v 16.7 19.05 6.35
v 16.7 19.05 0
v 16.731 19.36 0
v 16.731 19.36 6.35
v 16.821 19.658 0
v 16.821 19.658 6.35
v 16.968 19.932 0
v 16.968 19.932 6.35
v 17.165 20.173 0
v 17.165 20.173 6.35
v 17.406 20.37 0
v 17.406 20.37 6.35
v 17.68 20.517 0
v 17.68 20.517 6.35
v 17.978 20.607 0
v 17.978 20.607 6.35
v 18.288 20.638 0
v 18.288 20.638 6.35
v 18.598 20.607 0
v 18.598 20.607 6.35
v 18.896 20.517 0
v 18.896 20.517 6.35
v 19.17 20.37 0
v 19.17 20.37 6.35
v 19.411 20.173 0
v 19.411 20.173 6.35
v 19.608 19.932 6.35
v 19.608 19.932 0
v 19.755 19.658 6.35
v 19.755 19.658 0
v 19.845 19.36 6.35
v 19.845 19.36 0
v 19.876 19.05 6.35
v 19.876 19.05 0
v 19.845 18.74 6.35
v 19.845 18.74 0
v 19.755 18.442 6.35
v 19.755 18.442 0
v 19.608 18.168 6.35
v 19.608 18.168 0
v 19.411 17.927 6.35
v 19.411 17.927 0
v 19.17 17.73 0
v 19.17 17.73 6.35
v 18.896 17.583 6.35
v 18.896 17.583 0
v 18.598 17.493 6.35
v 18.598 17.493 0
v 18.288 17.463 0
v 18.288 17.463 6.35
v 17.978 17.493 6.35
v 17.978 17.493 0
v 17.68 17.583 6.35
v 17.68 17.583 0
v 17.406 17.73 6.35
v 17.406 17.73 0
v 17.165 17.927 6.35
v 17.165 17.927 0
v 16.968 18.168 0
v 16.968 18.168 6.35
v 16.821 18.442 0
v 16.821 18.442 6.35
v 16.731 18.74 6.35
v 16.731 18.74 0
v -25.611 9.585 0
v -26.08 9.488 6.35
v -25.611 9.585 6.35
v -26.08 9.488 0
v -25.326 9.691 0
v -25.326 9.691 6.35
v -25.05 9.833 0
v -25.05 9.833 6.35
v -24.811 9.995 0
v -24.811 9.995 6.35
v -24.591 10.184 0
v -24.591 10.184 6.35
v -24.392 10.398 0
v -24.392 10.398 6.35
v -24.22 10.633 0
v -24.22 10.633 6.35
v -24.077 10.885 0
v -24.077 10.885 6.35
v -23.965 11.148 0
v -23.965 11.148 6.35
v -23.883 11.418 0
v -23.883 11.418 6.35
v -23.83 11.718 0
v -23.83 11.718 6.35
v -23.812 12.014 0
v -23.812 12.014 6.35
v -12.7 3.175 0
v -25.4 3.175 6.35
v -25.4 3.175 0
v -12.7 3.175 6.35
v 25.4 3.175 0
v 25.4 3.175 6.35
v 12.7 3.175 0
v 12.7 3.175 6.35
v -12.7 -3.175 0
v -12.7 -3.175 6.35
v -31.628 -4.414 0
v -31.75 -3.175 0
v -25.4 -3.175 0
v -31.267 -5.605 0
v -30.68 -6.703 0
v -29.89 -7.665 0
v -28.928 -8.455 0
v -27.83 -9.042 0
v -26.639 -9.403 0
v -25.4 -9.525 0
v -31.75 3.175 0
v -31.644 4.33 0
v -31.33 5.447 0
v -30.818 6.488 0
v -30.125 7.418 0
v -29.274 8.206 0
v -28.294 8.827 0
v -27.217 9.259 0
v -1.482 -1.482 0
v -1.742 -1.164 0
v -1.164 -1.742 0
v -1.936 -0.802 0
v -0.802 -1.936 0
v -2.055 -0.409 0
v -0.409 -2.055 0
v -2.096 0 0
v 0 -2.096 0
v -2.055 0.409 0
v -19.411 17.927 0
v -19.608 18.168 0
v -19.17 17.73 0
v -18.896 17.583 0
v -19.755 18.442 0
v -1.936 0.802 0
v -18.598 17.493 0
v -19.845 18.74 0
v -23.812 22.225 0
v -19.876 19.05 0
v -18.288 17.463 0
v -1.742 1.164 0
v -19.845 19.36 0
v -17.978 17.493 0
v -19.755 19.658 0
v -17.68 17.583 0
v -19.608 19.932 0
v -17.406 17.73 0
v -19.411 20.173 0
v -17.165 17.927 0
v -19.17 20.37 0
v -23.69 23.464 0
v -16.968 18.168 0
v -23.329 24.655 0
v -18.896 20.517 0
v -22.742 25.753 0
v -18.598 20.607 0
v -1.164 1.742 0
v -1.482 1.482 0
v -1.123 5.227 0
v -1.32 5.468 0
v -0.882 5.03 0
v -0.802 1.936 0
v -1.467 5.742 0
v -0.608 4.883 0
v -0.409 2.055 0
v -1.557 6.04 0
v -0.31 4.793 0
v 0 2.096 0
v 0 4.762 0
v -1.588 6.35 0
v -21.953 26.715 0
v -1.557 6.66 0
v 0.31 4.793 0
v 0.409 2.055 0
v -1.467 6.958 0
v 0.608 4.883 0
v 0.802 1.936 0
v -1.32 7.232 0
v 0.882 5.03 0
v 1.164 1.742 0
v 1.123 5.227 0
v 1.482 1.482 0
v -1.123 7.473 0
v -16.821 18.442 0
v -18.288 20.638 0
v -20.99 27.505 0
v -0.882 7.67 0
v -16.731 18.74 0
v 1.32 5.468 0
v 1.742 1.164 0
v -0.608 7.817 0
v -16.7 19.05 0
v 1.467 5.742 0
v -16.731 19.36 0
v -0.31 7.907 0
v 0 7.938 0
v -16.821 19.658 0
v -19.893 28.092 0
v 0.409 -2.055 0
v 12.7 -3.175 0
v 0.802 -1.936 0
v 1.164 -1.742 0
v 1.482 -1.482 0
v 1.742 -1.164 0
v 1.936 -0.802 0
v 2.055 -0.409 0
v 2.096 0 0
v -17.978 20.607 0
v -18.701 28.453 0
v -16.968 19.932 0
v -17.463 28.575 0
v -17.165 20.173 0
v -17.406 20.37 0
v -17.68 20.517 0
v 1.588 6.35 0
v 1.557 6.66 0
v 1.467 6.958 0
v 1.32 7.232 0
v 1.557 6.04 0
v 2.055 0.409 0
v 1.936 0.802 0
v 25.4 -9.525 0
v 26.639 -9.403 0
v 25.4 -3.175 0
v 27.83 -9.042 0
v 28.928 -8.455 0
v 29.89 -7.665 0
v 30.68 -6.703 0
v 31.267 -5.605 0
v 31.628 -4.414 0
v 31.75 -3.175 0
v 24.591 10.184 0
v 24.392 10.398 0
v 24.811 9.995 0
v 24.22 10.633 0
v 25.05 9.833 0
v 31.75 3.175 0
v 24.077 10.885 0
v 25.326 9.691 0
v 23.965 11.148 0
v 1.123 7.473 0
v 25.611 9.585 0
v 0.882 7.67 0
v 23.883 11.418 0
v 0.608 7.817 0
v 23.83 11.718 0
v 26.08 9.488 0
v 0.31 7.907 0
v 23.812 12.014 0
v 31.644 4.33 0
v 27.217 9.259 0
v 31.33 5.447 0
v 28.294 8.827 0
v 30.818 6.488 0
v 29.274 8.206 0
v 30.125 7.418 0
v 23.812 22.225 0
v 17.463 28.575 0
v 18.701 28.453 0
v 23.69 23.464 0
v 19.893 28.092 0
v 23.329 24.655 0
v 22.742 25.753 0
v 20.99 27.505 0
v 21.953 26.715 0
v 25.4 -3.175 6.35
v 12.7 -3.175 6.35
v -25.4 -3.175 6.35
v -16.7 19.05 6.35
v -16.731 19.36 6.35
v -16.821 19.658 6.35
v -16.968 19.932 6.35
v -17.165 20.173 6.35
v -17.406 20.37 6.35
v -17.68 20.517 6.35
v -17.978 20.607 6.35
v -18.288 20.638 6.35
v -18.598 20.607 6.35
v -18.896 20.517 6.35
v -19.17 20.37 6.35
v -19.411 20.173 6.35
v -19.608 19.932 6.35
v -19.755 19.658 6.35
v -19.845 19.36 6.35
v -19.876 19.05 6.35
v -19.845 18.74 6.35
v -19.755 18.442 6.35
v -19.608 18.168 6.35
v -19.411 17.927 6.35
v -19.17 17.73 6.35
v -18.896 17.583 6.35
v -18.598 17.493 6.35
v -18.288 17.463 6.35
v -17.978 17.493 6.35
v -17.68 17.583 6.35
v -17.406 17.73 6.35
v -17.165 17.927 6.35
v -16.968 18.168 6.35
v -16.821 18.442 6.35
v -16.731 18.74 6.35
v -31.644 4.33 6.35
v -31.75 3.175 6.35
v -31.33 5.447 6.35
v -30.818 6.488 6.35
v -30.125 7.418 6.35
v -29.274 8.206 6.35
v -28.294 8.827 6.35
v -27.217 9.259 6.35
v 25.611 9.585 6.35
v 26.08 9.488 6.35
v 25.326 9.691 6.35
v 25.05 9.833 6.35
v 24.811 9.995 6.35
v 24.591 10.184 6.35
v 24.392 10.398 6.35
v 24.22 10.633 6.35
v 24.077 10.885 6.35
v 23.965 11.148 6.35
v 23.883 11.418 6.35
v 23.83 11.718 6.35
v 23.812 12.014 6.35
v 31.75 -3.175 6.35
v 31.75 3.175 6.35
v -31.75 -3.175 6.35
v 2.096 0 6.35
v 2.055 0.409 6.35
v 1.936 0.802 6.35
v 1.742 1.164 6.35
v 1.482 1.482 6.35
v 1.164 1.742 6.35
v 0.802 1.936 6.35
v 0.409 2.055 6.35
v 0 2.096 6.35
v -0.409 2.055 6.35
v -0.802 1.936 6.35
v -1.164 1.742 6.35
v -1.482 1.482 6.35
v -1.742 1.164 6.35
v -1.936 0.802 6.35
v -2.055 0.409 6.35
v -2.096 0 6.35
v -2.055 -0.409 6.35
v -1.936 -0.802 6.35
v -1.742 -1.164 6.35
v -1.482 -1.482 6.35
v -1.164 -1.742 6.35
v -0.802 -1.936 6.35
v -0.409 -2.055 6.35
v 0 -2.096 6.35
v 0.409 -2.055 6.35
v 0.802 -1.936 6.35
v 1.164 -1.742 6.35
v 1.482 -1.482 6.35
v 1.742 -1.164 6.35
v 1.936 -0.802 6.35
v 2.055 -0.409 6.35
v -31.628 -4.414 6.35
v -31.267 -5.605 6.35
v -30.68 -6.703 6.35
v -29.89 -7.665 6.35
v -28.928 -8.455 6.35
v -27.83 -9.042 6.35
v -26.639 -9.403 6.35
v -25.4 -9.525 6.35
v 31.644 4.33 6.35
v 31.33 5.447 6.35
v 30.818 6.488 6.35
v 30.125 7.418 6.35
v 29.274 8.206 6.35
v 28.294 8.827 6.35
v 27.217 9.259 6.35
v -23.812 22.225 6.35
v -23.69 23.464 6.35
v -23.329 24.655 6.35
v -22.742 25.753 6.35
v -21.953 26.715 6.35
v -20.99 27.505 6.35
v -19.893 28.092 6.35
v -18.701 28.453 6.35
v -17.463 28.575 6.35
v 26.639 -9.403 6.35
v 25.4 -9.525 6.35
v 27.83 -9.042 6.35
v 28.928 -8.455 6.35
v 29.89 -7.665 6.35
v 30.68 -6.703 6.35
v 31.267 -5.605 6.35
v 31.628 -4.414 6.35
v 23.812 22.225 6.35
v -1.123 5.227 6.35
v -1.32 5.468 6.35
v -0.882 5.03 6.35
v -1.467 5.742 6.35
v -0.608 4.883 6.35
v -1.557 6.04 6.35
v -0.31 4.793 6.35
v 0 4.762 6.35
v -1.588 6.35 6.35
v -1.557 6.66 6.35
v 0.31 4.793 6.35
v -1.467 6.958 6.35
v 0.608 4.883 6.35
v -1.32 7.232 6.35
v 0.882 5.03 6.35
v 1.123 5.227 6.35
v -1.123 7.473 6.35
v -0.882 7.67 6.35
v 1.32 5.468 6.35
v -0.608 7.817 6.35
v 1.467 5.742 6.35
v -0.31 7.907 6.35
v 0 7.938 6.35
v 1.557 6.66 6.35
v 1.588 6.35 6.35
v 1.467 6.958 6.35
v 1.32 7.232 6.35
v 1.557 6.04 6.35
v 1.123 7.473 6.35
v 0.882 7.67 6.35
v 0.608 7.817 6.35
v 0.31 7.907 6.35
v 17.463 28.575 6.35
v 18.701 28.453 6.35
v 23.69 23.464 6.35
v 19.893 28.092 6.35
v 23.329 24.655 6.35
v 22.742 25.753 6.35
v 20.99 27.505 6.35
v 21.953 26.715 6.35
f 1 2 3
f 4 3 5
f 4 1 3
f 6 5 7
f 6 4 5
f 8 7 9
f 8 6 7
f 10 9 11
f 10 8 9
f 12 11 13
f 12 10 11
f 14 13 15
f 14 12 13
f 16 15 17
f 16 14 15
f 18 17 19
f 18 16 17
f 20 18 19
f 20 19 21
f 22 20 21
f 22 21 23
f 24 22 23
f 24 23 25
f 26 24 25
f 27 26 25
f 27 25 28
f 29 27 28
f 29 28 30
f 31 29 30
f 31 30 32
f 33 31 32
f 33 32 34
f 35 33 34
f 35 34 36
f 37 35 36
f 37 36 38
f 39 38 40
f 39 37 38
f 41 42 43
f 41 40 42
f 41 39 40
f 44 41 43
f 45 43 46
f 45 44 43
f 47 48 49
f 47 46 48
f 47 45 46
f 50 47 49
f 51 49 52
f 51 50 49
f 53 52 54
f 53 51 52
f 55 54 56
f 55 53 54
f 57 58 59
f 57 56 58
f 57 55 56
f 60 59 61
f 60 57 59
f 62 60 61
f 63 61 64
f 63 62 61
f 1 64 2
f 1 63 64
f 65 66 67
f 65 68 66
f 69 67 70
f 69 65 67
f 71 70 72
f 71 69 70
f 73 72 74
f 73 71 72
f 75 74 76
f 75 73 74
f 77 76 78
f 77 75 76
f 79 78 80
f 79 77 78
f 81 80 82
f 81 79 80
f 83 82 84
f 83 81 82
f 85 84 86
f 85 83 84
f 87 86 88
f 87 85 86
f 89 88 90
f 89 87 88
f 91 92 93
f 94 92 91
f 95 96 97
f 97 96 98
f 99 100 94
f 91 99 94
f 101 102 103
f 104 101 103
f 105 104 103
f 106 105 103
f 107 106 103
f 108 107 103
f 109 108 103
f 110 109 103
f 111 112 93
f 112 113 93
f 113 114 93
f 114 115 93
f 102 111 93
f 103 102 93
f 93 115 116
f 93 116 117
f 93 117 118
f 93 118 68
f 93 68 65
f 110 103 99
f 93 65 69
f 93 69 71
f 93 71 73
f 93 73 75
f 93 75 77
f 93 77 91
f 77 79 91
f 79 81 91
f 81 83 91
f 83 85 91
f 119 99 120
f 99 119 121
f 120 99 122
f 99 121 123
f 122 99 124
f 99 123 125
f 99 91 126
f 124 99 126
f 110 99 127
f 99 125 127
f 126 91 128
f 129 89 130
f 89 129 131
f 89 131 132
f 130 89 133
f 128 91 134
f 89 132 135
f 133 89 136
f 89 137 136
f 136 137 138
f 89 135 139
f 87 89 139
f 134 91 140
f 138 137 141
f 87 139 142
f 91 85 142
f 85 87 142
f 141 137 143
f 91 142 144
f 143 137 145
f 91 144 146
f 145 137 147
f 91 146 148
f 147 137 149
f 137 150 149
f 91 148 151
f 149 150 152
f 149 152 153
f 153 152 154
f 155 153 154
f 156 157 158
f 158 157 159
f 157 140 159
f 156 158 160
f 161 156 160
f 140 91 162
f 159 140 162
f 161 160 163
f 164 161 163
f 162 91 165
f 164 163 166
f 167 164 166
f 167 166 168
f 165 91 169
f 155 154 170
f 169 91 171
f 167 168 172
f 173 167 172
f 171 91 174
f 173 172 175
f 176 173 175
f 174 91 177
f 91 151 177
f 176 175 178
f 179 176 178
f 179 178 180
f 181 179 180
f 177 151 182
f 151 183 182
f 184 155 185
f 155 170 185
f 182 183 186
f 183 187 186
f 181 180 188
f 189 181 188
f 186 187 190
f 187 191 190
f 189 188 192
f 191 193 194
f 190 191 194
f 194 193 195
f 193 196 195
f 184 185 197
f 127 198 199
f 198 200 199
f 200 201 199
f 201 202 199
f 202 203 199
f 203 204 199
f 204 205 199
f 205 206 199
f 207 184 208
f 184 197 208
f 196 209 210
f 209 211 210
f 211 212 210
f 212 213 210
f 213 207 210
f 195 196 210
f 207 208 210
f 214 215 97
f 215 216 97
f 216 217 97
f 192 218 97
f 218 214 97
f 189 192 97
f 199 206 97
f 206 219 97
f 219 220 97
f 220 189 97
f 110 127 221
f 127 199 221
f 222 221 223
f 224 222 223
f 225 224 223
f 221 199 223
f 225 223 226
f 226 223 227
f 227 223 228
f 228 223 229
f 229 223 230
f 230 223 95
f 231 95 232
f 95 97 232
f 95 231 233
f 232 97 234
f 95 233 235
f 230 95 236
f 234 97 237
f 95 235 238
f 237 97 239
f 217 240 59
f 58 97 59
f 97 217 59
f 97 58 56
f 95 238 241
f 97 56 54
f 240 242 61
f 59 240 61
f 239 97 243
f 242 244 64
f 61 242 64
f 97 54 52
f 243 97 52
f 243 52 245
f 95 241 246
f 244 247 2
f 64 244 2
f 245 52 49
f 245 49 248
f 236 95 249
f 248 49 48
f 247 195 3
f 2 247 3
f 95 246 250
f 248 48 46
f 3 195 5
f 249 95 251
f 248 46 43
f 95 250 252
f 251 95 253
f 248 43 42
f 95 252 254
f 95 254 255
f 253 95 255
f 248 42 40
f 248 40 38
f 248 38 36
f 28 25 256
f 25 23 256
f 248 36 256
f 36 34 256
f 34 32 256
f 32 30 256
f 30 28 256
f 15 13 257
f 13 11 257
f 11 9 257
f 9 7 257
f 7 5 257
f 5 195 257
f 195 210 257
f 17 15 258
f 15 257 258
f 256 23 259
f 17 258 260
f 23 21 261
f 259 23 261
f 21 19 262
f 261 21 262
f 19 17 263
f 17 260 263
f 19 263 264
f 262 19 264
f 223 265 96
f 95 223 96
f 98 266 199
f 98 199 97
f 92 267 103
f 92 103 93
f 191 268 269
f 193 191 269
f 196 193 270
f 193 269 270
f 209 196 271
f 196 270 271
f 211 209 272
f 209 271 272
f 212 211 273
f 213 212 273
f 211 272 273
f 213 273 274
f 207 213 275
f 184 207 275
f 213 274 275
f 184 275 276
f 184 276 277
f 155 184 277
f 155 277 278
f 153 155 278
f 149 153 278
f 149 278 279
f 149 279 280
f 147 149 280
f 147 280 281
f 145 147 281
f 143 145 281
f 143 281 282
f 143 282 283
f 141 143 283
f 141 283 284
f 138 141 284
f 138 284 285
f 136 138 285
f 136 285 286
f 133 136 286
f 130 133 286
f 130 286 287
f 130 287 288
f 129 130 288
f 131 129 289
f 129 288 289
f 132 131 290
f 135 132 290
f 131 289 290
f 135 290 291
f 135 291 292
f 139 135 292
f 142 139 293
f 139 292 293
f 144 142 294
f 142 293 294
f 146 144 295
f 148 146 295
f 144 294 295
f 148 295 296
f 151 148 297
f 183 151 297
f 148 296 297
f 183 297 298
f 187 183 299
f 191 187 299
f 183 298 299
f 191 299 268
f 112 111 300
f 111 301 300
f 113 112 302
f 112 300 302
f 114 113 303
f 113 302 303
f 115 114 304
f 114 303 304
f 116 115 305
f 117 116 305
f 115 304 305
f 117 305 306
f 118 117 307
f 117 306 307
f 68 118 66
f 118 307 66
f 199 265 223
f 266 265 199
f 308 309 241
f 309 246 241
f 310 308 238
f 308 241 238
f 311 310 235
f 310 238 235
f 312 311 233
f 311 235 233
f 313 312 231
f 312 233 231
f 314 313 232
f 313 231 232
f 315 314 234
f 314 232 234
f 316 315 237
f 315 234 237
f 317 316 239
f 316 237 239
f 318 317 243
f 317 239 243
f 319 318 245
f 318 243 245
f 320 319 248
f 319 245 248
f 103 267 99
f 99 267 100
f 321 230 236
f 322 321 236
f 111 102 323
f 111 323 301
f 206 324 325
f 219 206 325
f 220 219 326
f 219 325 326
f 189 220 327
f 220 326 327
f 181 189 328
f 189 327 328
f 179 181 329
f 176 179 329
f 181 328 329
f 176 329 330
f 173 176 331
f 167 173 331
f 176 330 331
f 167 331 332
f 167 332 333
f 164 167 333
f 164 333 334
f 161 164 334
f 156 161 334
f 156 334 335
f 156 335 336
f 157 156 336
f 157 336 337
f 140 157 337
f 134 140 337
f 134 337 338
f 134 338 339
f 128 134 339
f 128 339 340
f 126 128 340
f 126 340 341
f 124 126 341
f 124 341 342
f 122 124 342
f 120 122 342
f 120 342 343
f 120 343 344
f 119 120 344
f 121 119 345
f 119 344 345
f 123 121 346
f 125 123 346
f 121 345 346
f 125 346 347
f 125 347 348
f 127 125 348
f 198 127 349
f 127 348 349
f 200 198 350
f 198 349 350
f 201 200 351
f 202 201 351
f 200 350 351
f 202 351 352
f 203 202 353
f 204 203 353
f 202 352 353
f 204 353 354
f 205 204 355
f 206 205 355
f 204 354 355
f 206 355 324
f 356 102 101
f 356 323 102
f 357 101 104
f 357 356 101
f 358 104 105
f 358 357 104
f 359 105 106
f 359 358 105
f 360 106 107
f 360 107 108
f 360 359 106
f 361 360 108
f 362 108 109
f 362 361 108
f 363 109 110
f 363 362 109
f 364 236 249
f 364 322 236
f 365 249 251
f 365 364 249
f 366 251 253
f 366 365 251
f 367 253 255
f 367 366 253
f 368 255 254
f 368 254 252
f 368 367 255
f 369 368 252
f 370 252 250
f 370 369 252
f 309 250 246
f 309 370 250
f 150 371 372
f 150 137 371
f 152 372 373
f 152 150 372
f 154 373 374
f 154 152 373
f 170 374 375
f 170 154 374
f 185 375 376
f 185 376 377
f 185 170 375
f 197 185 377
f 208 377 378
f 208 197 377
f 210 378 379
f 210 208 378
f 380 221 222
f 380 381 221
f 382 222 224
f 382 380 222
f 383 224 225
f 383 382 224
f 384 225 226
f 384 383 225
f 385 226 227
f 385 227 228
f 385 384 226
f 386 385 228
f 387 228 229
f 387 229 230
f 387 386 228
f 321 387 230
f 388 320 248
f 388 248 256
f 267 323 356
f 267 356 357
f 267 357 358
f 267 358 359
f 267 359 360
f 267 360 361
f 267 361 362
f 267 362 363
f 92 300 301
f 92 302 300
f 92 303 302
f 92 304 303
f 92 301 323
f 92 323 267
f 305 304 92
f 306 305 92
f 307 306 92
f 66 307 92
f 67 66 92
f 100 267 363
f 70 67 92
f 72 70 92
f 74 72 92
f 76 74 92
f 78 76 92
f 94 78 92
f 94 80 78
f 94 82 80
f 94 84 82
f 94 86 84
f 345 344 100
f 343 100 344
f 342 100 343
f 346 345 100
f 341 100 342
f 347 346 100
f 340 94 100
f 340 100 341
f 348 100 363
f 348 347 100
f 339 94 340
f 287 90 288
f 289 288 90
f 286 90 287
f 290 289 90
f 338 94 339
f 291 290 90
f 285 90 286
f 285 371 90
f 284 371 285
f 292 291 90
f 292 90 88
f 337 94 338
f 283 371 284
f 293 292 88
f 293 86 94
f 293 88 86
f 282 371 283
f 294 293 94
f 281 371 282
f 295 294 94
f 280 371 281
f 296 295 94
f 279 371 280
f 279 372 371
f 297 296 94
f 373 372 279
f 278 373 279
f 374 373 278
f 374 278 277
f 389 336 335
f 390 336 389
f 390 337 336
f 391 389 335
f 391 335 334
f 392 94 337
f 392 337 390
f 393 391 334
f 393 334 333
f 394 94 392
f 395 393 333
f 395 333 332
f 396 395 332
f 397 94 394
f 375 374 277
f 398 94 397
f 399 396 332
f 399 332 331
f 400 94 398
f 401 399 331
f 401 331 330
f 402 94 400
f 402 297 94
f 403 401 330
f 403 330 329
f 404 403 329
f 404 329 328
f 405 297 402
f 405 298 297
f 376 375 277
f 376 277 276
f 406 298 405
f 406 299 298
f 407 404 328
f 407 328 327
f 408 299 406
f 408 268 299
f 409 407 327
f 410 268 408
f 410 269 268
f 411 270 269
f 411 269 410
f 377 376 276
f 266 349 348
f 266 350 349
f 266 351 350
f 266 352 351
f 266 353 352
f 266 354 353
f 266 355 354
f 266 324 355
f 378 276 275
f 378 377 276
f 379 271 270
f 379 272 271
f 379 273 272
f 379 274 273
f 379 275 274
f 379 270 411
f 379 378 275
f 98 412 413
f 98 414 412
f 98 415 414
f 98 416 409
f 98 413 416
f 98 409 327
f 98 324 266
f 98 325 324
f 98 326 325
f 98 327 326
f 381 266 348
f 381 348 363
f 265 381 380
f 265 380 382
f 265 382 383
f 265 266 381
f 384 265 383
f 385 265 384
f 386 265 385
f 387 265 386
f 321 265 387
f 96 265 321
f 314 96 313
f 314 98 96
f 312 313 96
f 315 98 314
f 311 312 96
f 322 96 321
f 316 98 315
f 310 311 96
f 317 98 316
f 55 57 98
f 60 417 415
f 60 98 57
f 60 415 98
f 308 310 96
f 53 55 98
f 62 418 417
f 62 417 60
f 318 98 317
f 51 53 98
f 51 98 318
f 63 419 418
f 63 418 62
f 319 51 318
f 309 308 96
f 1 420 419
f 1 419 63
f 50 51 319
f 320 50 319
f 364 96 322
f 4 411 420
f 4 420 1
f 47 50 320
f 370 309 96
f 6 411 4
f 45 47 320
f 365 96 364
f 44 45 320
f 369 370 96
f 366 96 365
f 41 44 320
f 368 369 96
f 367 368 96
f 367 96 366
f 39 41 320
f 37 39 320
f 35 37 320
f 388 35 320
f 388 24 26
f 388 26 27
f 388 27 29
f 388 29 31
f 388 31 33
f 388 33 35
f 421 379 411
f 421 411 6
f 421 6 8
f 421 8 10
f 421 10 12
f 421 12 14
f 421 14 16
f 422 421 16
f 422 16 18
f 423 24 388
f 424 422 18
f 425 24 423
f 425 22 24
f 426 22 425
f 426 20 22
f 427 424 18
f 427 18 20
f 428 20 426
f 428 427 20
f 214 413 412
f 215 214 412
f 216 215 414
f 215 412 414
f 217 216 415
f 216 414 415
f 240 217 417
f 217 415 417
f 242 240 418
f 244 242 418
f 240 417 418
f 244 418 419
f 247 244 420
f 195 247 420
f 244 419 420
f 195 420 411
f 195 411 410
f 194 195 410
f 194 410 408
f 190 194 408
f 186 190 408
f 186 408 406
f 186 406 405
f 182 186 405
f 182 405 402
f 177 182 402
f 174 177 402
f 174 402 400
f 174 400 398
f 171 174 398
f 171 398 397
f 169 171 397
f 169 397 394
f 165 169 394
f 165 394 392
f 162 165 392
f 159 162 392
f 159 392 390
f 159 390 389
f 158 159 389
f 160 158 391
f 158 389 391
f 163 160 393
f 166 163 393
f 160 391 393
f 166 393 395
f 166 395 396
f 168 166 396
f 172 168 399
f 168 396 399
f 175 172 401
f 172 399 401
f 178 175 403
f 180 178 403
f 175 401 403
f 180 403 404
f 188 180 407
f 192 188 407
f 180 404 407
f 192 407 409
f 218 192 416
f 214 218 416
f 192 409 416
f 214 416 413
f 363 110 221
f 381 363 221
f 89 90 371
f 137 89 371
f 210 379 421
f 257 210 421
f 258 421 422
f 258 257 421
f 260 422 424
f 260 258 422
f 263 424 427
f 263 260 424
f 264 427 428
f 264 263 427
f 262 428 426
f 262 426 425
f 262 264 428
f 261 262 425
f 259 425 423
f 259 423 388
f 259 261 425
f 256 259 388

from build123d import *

# Parameters (mm, degrees)
SKETCH1_W           = 63.5
SKETCH1_H           = 19.05
BOSS_EXTRUDE1_DEPTH = 6.35
SKETCH2_R           = 2.0955
CUT_EXTRUDE1_DEPTH  = 34.750712955
SKETCH3_W           = 12.7
SKETCH3_H           = 6.35
CUT_EXTRUDE2_DEPTH  = 34.750712955
SKETCH4_W           = 47.625
SKETCH4_H           = 19.05
BOSS_EXTRUDE2_DEPTH = 6.35
SKETCH5_R           = 1.5875
CUT_EXTRUDE3_DEPTH  = 44.184668865
SKETCH6_R           = 1.5875
CUT_EXTRUDE4_DEPTH  = 44.184668865
FILLET3_R           = 6.35
FILLET4_R           = 2.54


with BuildPart() as part:
    # Sketch1 → Boss-Extrude1 (new body)
    with BuildSketch(Plane.XY):
        Rectangle(SKETCH1_W, SKETCH1_H)
    extrude(amount=BOSS_EXTRUDE1_DEPTH)

    # Sketch2 → Cut-Extrude1 (cut, through all)
    with BuildSketch(Plane.XY.offset(6.35)):
        Circle(SKETCH2_R)
    extrude(amount=-CUT_EXTRUDE1_DEPTH, mode=Mode.SUBTRACT)

    # Sketch3 → Cut-Extrude2 (cut, through all)
    with BuildSketch(Plane.XY.offset(6.35)):
        with Locations((-19.05, 0)):
            Rectangle(SKETCH3_W, SKETCH3_H)
    cut_extrude2 = extrude(amount=-CUT_EXTRUDE2_DEPTH, mode=Mode.SUBTRACT)

    # Mirror1: Cut-Extrude2 across plane
    add(cut_extrude2.mirror(Plane(origin=(0, 0, 0), x_dir=(0, 0, 1), z_dir=(1, 0, 0))), mode=Mode.SUBTRACT)

    # Sketch4 → Boss-Extrude2 (add)
    with BuildSketch(Plane.XY.offset(6.35)):
        with Locations((0, 19.05)):
            Rectangle(SKETCH4_W, SKETCH4_H)
    extrude(amount=-BOSS_EXTRUDE2_DEPTH)

    # Sketch5 → Cut-Extrude3 (cut, through all)
    with BuildSketch(Plane.XY.offset(6.35)):
        with Locations((-18.288, 19.05)):
            Circle(SKETCH5_R)
    cut_extrude3 = extrude(amount=-CUT_EXTRUDE3_DEPTH, mode=Mode.SUBTRACT)

    # Mirror2: Cut-Extrude3 across plane
    add(cut_extrude3.mirror(Plane(origin=(0, 0, 0), x_dir=(0, 0, 1), z_dir=(1, 0, 0))), mode=Mode.SUBTRACT)

    # Sketch6 → Cut-Extrude4 (cut, through all)
    with BuildSketch(Plane.XY.offset(6.35)):
        with Locations((0, 6.35)):
            Circle(SKETCH6_R)
    extrude(amount=-CUT_EXTRUDE4_DEPTH, mode=Mode.SUBTRACT)

    # Fillet3
    fillet3_edges = [part.edges().sort_by_distance(p)[0] for p in [
        (23.8125, 28.575, 3.175),
        (-23.8125, 28.575, 3.175),
        (31.75, -9.525, 3.175),
        (-31.75, -9.525, 3.175),
        (-31.75, 9.525, 3.175),
        (31.75, 9.525, 3.175),
    ]]
    fillet(fillet3_edges, radius=FILLET3_R)

    # Fillet4
    fillet4_edges = [part.edges().sort_by_distance(p)[0] for p in [
        (23.8125, 9.525, 3.175),
        (-23.8125, 9.525, 3.175),
    ]]
    fillet(fillet4_edges, radius=FILLET4_R)


solid = part.part
